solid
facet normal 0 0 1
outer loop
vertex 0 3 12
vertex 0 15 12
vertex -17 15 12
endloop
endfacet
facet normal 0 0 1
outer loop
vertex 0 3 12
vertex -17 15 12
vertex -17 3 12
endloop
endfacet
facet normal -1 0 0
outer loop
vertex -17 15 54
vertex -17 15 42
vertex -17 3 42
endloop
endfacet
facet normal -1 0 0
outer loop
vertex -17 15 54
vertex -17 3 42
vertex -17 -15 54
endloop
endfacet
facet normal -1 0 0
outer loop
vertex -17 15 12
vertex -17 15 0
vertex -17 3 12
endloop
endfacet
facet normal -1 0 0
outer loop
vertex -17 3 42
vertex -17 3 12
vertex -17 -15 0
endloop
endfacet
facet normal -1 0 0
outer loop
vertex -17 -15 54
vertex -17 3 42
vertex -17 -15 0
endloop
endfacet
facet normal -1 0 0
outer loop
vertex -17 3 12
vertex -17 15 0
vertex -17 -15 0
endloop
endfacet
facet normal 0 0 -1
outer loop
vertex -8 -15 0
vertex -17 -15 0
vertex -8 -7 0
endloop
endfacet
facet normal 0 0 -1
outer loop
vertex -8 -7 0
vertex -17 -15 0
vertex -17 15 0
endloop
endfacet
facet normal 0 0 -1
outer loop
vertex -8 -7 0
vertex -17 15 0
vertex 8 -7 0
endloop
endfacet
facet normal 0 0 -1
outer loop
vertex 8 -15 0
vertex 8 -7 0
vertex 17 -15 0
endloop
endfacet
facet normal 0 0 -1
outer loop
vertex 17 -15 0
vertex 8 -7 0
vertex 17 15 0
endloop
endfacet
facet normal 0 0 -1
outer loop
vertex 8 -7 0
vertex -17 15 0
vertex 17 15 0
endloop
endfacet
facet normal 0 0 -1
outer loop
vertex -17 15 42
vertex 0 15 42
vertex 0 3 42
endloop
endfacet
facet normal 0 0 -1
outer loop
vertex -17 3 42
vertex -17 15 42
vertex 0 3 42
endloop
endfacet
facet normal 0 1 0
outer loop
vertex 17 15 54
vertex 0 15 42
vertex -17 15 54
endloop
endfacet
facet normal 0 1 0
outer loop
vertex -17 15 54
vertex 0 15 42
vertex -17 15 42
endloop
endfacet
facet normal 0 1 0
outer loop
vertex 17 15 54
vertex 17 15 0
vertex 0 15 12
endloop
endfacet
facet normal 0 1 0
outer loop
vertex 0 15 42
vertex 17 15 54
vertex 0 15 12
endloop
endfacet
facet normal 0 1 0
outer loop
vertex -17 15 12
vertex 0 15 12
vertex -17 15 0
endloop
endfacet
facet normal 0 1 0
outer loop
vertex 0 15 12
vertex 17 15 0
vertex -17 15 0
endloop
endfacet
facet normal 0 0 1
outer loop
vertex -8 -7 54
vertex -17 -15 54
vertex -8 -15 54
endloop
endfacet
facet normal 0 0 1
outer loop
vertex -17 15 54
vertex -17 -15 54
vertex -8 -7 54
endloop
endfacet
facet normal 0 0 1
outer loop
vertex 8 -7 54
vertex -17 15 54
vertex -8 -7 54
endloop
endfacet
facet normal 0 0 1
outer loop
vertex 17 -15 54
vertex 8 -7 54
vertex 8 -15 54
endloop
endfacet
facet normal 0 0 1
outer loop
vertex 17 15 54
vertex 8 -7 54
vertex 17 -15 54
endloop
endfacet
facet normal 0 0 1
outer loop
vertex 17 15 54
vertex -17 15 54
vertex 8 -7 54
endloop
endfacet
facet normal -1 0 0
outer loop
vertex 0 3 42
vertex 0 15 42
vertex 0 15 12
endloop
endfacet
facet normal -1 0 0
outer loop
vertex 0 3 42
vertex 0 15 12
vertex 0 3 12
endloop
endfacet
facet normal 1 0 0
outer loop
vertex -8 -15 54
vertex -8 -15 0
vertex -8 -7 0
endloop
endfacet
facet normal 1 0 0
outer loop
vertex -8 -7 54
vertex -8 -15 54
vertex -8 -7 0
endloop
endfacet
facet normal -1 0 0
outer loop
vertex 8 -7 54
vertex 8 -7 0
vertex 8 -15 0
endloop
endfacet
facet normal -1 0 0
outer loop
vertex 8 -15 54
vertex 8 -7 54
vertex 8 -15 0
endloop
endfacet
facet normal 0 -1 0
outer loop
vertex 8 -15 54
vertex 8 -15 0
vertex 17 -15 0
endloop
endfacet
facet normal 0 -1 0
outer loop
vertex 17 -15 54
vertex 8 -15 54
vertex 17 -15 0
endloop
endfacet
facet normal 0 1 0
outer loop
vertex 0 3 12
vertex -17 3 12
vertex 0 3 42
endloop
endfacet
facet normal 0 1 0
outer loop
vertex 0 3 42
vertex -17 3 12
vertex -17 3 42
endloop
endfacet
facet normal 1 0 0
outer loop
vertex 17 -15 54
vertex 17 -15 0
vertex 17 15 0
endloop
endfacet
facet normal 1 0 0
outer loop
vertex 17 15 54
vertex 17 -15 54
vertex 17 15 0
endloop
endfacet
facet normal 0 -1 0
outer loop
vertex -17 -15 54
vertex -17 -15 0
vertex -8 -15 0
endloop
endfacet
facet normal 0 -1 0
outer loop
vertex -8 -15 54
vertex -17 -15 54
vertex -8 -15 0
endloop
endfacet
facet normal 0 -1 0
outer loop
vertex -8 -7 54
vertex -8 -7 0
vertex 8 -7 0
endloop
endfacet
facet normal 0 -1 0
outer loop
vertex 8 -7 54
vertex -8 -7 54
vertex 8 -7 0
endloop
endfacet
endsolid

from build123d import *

# Parameters (mm, degrees)
F1_DEPTH = 54
F2_W     = 12
F2_H     = 30
F3_DEPTH = 17


with BuildPart() as f1:
    # F0 (on Top) → F1 (new body)
    with BuildSketch(Plane.XY):
        Polygon((17, 15), (-17, 15), (-17, -15), (-8, -15), (-8, -7), (0, -7), (8, -7), (8, -15), (17, -15), align=None)
    extrude(amount=F1_DEPTH)

    # F2 (on face) → F3 (cut)
    with BuildSketch(Plane(origin=(-17, 0, 0), x_dir=(0, -1, 0), z_dir=(-1, 0, 0))):
        with Locations((-9, 27)):
            Rectangle(F2_W, F2_H)
    extrude(amount=-F3_DEPTH, mode=Mode.SUBTRACT)


solid = f1.part
